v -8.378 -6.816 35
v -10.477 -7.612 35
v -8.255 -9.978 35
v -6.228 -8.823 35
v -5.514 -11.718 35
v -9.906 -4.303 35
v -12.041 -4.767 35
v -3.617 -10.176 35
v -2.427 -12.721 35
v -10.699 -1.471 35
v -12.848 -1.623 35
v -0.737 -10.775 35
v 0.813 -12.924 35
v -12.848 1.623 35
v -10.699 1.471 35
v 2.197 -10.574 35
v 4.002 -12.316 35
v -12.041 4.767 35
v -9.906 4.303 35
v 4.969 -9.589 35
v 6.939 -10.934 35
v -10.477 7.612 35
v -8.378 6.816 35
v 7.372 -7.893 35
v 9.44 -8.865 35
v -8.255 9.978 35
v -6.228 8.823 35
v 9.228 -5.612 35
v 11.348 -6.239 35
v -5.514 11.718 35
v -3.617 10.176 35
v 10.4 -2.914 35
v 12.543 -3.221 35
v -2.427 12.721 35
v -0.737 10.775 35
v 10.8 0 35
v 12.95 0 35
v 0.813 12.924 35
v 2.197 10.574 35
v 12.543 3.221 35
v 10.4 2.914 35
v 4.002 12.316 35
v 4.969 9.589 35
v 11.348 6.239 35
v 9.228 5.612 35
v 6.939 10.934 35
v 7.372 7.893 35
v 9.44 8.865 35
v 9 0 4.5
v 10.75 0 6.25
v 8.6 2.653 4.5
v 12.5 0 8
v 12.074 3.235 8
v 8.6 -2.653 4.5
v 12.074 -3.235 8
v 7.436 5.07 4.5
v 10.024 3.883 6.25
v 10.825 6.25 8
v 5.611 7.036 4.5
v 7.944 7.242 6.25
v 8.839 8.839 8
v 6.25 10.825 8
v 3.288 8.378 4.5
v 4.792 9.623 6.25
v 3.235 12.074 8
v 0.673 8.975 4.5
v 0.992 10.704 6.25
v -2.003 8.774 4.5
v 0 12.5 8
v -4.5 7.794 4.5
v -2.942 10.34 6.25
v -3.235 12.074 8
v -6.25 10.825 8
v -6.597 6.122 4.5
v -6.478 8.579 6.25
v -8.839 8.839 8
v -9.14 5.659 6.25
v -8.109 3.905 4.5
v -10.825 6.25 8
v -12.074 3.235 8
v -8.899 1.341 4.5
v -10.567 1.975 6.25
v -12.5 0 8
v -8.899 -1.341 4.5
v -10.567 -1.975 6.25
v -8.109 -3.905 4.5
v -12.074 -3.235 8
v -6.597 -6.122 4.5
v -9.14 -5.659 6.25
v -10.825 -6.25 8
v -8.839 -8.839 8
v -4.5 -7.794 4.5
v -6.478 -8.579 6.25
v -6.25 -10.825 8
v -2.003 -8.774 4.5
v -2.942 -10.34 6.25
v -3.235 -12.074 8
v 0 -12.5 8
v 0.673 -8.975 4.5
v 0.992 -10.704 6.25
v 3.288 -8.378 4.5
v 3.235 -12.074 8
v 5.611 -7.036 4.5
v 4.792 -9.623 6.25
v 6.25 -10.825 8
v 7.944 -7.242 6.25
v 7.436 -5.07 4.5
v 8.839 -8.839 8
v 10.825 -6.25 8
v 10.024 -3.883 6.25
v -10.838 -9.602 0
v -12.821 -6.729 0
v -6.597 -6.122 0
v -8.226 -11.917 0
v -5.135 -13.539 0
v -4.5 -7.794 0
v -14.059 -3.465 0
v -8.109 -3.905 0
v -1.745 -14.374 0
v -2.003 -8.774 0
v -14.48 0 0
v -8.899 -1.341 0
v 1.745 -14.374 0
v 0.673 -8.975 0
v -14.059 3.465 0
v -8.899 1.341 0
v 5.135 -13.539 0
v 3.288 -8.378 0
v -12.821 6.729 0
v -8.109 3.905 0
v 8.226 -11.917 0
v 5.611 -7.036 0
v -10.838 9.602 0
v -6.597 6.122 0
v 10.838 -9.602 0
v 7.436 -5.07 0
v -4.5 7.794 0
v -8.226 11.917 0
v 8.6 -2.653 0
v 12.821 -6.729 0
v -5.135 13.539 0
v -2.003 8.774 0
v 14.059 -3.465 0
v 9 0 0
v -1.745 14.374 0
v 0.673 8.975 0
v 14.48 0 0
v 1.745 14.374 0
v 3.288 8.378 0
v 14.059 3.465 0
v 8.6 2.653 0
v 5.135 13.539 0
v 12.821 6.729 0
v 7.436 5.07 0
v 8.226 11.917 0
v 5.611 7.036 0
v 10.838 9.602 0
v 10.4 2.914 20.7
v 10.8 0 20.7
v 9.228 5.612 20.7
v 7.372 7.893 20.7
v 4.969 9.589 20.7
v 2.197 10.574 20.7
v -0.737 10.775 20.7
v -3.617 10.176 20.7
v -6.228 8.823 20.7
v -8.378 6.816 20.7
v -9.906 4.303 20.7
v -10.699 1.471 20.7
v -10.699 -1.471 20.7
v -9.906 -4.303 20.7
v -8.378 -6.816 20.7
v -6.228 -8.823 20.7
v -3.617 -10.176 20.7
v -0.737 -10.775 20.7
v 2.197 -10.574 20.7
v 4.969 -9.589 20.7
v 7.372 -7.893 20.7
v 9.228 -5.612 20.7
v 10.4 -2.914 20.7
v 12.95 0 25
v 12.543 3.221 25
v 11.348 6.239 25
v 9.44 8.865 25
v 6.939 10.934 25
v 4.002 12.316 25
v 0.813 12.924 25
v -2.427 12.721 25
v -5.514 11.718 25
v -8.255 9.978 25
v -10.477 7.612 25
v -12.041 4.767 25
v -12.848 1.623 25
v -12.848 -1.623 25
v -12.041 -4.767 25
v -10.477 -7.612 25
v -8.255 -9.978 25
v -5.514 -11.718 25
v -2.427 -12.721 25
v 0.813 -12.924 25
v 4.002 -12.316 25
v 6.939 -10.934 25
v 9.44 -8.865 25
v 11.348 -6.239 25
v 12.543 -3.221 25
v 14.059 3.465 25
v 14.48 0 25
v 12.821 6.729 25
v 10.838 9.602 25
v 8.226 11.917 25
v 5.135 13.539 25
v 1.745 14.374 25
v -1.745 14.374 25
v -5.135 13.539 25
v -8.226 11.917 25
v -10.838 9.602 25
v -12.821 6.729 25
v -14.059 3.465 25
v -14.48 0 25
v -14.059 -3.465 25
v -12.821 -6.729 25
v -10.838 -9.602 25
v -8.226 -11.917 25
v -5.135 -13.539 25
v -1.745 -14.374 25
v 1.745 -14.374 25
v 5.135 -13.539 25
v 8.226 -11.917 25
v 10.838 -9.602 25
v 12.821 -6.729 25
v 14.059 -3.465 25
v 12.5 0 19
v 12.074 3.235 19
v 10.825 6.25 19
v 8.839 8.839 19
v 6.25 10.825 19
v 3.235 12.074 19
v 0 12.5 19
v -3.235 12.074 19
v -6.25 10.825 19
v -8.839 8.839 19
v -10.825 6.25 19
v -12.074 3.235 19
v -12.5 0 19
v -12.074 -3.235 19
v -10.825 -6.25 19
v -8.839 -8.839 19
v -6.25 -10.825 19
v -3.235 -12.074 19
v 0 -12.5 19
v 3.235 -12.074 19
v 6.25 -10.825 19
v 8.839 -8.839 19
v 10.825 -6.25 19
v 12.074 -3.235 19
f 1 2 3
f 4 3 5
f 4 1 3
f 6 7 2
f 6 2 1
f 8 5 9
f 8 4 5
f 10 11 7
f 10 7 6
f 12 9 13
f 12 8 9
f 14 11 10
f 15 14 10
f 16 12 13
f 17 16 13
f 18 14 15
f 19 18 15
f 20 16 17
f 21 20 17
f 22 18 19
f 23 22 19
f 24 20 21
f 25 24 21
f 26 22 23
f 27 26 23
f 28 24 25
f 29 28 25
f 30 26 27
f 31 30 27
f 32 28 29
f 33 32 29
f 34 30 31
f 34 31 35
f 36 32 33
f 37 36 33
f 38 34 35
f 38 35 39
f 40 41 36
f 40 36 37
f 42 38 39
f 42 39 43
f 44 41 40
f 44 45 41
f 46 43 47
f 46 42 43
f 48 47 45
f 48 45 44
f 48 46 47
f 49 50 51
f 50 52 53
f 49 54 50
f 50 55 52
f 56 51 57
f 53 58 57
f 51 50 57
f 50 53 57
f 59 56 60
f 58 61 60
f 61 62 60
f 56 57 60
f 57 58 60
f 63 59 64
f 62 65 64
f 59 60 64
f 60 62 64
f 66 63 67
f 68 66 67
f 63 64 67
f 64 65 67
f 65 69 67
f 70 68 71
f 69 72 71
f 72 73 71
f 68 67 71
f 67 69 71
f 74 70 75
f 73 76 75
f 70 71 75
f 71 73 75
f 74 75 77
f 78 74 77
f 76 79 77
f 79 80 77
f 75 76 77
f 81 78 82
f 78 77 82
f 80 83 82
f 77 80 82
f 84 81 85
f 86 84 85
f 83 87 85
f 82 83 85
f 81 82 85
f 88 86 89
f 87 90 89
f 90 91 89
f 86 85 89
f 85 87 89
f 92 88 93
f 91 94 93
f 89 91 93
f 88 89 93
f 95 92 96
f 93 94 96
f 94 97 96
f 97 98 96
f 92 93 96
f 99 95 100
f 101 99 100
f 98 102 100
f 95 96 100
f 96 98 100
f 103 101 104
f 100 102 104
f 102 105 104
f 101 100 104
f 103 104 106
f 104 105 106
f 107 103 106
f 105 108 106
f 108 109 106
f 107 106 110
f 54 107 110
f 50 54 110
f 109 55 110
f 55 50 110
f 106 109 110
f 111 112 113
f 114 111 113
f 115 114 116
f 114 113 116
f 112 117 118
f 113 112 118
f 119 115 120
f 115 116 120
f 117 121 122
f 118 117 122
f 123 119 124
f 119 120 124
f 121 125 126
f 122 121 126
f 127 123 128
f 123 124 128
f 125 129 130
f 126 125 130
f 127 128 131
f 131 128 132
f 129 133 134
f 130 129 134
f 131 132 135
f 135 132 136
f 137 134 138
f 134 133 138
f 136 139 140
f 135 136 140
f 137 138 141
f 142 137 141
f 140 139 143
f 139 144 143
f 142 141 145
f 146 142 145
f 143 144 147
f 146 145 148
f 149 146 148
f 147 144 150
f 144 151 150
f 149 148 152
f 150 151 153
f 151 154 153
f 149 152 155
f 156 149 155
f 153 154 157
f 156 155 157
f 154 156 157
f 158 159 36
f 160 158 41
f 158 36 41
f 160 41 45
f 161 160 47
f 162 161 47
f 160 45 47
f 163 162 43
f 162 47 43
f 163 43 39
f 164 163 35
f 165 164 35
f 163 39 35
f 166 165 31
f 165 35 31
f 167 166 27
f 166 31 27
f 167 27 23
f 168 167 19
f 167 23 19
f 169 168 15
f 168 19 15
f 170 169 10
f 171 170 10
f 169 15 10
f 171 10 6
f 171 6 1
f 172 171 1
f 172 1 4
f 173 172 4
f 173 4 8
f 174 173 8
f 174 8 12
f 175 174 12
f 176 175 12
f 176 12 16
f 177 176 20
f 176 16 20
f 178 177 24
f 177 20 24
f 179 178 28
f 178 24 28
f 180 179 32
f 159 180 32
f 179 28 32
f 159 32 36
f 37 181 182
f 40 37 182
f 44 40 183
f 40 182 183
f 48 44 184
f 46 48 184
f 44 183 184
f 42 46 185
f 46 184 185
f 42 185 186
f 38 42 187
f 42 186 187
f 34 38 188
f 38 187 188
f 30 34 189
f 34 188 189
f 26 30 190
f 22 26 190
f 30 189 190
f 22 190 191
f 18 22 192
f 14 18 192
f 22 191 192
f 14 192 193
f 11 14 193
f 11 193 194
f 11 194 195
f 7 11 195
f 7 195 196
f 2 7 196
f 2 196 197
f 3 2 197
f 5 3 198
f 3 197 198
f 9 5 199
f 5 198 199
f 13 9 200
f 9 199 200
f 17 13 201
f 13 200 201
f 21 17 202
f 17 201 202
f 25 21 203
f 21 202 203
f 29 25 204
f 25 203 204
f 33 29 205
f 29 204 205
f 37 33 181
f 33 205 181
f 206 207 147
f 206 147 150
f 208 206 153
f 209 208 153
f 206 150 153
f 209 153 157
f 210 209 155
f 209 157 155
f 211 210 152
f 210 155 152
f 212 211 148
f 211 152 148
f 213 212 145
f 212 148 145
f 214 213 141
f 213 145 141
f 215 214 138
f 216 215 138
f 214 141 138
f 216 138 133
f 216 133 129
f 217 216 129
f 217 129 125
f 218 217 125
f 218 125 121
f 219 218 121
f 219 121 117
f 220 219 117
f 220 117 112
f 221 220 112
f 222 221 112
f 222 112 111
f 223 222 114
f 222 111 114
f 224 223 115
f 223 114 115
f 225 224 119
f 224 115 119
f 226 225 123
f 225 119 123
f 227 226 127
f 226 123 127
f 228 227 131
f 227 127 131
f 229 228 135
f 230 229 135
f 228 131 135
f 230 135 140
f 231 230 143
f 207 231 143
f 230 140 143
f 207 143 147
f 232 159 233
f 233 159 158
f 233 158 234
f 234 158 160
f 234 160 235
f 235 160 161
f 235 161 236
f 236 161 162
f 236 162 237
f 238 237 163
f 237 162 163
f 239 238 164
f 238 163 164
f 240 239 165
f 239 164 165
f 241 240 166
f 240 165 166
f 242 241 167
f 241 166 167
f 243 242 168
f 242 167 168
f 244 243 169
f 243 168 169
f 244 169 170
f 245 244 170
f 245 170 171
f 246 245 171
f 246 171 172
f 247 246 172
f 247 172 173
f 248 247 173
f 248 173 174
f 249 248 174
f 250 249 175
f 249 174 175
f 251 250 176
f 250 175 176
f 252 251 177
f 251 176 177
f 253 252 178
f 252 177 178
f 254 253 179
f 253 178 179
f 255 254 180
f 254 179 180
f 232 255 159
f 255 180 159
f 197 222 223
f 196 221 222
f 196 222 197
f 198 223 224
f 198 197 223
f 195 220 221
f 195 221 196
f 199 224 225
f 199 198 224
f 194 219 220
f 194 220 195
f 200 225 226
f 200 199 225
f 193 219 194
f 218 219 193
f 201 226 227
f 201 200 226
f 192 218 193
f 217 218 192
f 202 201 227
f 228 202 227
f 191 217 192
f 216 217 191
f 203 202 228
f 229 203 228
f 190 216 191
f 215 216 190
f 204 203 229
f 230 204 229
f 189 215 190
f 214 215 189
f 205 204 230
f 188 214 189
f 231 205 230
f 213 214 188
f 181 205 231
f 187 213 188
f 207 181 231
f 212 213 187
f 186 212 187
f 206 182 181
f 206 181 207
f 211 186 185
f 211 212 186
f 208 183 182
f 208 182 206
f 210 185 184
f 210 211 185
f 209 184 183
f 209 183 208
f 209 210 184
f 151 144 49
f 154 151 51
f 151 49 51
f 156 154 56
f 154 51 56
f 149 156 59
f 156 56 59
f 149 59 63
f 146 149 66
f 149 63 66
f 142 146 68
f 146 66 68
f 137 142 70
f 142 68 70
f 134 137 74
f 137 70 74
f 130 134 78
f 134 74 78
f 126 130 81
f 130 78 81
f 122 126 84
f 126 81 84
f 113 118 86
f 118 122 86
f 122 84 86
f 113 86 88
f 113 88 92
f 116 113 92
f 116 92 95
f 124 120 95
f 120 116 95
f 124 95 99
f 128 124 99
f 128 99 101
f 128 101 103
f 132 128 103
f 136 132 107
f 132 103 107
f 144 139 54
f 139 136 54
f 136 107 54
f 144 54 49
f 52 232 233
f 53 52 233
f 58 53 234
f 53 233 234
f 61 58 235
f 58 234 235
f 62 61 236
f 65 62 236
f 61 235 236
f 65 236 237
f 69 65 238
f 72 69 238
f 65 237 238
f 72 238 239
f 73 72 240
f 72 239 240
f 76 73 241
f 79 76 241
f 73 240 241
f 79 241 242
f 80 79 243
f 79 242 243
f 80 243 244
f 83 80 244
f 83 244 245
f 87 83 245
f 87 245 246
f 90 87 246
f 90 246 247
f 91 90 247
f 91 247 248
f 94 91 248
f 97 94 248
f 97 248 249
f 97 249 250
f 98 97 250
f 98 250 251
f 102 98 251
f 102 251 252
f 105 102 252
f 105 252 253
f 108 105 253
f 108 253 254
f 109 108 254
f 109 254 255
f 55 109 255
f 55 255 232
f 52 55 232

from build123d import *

# Parameters (mm, degrees)
F0_R          = 14.48
F1_DEPTH      = 25
F2_R          = 12.5
F3_DEPTH      = 22
F4_R          = 9
F5_DEPTH      = 3
F6_R          = 12.5
F7_DEPTH      = 1
F8_R          = 12.95
F9_DEPTH      = 10
F10_R         = 10.8
F11_DEPTH     = 11
F12_S5_R      = 10.8
F12_T6_DEPTH  = 19
F12_S11_R     = 9
F12_T12_DEPTH = 19


# Not quite as in the source:
# - a fillet or chamfer that OpenCascade refuses, or shapes differently, is made with other operations: its cross-section is extruded or revolved along the edge and cut away or added


with BuildPart() as f1:
    # F0 (on Top) → F1 (new body)
    with BuildSketch(Plane.XY):
        Circle(F0_R)
    extrude(amount=F1_DEPTH)

    # F2 (on face) → F3 (cut)
    with BuildSketch(Plane.XY.offset(25)):
        Circle(F2_R)
    extrude(amount=-F3_DEPTH, mode=Mode.SUBTRACT)

    # F4 (on face) → F5 (cut, through all)
    with BuildSketch(Plane(origin=(0, 0, 0), x_dir=(1, 0, 0), z_dir=(0, 0, -1))):
        Circle(F4_R)
    extrude(amount=-F5_DEPTH, mode=Mode.SUBTRACT)

    # F6 (on face) → F7 (join)
    with BuildSketch(Plane.XY.offset(25)):
        Circle(F6_R)
    extrude(amount=-F7_DEPTH)

    # F8 (on face) → F9 (join)
    with BuildSketch(Plane.XY.offset(25)):
        Circle(F8_R)
    extrude(amount=F9_DEPTH)

    # F10 (on face) → F11 (cut, through all)
    with BuildSketch(Plane.XY.offset(35)):
        Circle(F10_R)
    extrude(amount=-F11_DEPTH, mode=Mode.SUBTRACT)

    # F12: chamfer of 5 on 3 edges, made by hand


with BuildPart() as f12_tool2:
    # F12_s3 → F12_t4 (revolve)
    with BuildSketch(Plane.XZ):
        Polygon((12.5, 19), (7.5, 24), (12.5, 24), align=None)
    revolve(axis=Axis((0, 0, 24), (0, 0, 1)))

    # F12_s5 → F12_t6 (cut, symmetric)
    with BuildSketch(Plane.XY.offset(21.5)):
        Circle(F12_S5_R)
    extrude(amount=F12_T6_DEPTH, both=True, mode=Mode.SUBTRACT)


with BuildPart() as f1_1:
    add(f1.part)

    # F12_t1: union F12_tool2
    add(f12_tool2.part)


with BuildPart() as f12_tool8:
    # F12_s9 → F12_t10 (revolve)
    with BuildSketch(Plane.XZ):
        Polygon((7.5, 3), (12.5, 8), (12.5, 3), align=None)
    revolve(axis=Axis((0, 0, 3), (0, 0, 1)))

    # F12_s11 → F12_t12 (cut, symmetric)
    with BuildSketch(Plane.XY.offset(5.5)):
        Circle(F12_S11_R)
    extrude(amount=F12_T12_DEPTH, both=True, mode=Mode.SUBTRACT)


with BuildPart() as f1_2:
    add(f1_1.part)

    # F12_t7: union F12_tool8
    add(f12_tool8.part)


solid = f1_2.part
